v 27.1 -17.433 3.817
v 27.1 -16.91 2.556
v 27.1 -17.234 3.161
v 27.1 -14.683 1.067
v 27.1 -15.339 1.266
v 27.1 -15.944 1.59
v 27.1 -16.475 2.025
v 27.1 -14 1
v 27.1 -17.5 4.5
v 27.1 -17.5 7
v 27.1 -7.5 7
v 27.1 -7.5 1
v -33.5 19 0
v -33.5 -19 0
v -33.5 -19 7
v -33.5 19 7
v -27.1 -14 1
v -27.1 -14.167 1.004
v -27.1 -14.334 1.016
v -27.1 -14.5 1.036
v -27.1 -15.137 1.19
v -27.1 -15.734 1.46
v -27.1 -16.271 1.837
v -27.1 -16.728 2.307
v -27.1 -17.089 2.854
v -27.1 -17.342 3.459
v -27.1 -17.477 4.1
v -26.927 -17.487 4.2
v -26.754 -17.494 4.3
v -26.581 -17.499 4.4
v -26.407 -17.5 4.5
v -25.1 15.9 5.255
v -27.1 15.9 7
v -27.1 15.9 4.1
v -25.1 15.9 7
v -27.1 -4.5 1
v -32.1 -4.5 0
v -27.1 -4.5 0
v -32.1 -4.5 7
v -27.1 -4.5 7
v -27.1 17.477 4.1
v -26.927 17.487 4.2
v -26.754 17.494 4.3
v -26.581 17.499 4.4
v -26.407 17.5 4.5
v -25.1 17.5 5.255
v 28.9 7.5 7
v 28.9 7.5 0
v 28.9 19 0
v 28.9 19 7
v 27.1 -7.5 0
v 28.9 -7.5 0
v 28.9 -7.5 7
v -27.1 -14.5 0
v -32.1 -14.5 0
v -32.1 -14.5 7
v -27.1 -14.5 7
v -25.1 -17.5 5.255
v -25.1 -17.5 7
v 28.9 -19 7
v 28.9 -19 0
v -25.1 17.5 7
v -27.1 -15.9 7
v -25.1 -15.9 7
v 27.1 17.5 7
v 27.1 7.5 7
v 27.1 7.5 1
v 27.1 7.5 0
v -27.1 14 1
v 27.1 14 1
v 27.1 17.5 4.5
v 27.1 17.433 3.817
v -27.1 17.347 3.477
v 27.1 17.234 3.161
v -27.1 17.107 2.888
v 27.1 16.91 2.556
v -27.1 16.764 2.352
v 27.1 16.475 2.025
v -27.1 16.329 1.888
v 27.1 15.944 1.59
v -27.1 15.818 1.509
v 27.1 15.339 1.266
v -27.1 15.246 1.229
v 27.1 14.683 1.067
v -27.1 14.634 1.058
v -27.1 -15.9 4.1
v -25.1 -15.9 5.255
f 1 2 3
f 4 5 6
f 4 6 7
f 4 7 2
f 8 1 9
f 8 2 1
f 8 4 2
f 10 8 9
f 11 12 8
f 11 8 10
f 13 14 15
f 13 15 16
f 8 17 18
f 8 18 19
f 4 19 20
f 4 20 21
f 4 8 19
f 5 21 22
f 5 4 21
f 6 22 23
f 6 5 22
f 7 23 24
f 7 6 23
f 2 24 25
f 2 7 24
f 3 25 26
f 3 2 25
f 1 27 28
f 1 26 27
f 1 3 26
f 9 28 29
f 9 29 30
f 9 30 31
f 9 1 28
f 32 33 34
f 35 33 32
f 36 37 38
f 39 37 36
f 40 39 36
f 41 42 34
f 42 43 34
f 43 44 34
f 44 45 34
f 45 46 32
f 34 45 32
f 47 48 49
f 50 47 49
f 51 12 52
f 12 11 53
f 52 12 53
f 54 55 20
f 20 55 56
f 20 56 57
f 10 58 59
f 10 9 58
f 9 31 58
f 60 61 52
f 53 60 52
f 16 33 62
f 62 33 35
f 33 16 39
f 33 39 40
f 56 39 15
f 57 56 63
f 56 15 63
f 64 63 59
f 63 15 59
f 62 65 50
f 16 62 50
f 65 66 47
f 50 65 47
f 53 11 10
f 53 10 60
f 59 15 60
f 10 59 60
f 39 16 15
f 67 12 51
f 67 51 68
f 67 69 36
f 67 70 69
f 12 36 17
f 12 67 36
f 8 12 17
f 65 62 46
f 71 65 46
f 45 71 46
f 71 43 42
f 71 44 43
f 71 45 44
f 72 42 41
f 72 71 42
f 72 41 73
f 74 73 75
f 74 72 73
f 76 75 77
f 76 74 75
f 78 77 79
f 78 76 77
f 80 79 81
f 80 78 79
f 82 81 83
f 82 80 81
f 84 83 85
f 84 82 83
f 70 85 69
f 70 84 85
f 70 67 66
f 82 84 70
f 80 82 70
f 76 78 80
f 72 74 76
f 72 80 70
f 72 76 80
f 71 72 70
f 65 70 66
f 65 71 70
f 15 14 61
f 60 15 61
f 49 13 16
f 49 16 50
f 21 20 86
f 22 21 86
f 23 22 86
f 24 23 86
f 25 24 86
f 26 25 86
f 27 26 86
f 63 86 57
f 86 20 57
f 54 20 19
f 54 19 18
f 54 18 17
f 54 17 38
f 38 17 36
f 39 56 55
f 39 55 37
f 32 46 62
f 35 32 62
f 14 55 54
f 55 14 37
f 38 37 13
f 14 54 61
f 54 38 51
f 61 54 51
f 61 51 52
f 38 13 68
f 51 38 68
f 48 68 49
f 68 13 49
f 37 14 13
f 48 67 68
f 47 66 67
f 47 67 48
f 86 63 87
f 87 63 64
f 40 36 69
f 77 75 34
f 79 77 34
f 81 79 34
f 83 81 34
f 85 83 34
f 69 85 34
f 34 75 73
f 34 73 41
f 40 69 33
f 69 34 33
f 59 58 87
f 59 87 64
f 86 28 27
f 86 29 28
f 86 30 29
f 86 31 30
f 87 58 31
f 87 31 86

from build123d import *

# Parameters (mm, degrees)
SKETCH2_W                 = 62.4
SKETCH2_H                 = 38
BOSS_EXTRUDE1_DEPTH       = 7
CUT_EXTRUDE1_DEPTH        = 27.1
SKETCH4_W                 = 1.8
SKETCH4_H                 = 15
FORFINGER_DEPTH           = 40.143965052
SKETCH5_W                 = 2
SKETCH5_H                 = 2.9
BOSS_EXTRUDE2_DEPTH       = 1.6
CHAMFER1_SIZE2            = 1.154700538
CHAMFER1_SIZE             = 2
CHAMFER1_OF_MIRROR1_SIZE2 = 1.154700538
CHAMFER1_OF_MIRROR1_SIZE  = 2
SKETCH6_W                 = 5
SKETCH6_H                 = 10
CUT_EXTRUDE3_DEPTH        = 40.143965052


with BuildPart() as part:
    # Sketch2 → Boss-Extrude1 (new body)
    with BuildSketch(Plane.XY):
        with Locations((-2.3, 0)):
            Rectangle(SKETCH2_W, SKETCH2_H)
    extrude(amount=BOSS_EXTRUDE1_DEPTH)

    # Sketch3 → Cut-Extrude1 (cut, symmetric)
    with BuildSketch(Plane(origin=(0, 0, 0), x_dir=(0, 0, -1), z_dir=(1, 0, 0))):
        with BuildLine():
            Line((-8, 17.5), (-4.5, 17.5))
            ThreePointArc((-4.5, 17.5), (-2.025126266, 16.474873734), (-1, 14))
            Line((-1, 14), (-1, -14))
            ThreePointArc((-1, -14), (-2.025126266, -16.474873734), (-4.5, -17.5))
            Line((-4.5, -17.5), (-8, -17.5))
            Line((-8, -17.5), (-8, 17.5))
        make_face()
    extrude(amount=CUT_EXTRUDE1_DEPTH, both=True, mode=Mode.SUBTRACT)

    # Sketch4 → ForFinger (cut, through all)
    with BuildSketch(Plane.XY.offset(7)):
        with Locations((28, 0)):
            Rectangle(SKETCH4_W, SKETCH4_H)
    extrude(amount=-FORFINGER_DEPTH, mode=Mode.SUBTRACT)

    # Sketch5 → Boss-Extrude2 (add)
    with BuildSketch(Plane.XZ.offset(-17.5)):
        with Locations((-26.1, 5.55)):
            Rectangle(SKETCH5_W, SKETCH5_H)
    boss_extrude2 = extrude(amount=BOSS_EXTRUDE2_DEPTH)

    # Chamfer1
    chamfer1_edges = [part.edges().sort_by_distance(p)[0] for p in [
        (-25.1, 16.688533865, 4.1),
    ]]
    chamfer1_side = [part.faces().sort_by_distance(p)[0] for p in [
        (-25.123094011, 16.688533865, 4.1),
    ]]
    chamfer(chamfer1_edges, length=CHAMFER1_SIZE - 0.0001, length2=CHAMFER1_SIZE2 - 0.0001, reference=chamfer1_side[0])  # a hair under: the kernel refuses the full size

    # Mirror1: Boss-Extrude2 across plane
    add(boss_extrude2.mirror(Plane.ZX))

    # Chamfer1 of Mirror1
    chamfer1_of_mirror1_edges = [part.edges().sort_by_distance(p)[0] for p in [
        (-25.1, -16.688533865, 4.1),
    ]]
    chamfer1_of_mirror1_side = [part.faces().sort_by_distance(p)[0] for p in [
        (-25.123094011, -16.688533865, 4.1),
    ]]
    chamfer(chamfer1_of_mirror1_edges, length=CHAMFER1_OF_MIRROR1_SIZE - 0.0001, length2=CHAMFER1_OF_MIRROR1_SIZE2 - 0.0001, reference=chamfer1_of_mirror1_side[0])  # a hair under: the kernel refuses the full size

    # Sketch6 → Cut-Extrude3 (cut, through all)
    with BuildSketch(Plane.XY.offset(7)):
        with Locations((-29.6, -9.5)):
            Rectangle(SKETCH6_W, SKETCH6_H)
    extrude(amount=-CUT_EXTRUDE3_DEPTH, mode=Mode.SUBTRACT)


solid = part.part
